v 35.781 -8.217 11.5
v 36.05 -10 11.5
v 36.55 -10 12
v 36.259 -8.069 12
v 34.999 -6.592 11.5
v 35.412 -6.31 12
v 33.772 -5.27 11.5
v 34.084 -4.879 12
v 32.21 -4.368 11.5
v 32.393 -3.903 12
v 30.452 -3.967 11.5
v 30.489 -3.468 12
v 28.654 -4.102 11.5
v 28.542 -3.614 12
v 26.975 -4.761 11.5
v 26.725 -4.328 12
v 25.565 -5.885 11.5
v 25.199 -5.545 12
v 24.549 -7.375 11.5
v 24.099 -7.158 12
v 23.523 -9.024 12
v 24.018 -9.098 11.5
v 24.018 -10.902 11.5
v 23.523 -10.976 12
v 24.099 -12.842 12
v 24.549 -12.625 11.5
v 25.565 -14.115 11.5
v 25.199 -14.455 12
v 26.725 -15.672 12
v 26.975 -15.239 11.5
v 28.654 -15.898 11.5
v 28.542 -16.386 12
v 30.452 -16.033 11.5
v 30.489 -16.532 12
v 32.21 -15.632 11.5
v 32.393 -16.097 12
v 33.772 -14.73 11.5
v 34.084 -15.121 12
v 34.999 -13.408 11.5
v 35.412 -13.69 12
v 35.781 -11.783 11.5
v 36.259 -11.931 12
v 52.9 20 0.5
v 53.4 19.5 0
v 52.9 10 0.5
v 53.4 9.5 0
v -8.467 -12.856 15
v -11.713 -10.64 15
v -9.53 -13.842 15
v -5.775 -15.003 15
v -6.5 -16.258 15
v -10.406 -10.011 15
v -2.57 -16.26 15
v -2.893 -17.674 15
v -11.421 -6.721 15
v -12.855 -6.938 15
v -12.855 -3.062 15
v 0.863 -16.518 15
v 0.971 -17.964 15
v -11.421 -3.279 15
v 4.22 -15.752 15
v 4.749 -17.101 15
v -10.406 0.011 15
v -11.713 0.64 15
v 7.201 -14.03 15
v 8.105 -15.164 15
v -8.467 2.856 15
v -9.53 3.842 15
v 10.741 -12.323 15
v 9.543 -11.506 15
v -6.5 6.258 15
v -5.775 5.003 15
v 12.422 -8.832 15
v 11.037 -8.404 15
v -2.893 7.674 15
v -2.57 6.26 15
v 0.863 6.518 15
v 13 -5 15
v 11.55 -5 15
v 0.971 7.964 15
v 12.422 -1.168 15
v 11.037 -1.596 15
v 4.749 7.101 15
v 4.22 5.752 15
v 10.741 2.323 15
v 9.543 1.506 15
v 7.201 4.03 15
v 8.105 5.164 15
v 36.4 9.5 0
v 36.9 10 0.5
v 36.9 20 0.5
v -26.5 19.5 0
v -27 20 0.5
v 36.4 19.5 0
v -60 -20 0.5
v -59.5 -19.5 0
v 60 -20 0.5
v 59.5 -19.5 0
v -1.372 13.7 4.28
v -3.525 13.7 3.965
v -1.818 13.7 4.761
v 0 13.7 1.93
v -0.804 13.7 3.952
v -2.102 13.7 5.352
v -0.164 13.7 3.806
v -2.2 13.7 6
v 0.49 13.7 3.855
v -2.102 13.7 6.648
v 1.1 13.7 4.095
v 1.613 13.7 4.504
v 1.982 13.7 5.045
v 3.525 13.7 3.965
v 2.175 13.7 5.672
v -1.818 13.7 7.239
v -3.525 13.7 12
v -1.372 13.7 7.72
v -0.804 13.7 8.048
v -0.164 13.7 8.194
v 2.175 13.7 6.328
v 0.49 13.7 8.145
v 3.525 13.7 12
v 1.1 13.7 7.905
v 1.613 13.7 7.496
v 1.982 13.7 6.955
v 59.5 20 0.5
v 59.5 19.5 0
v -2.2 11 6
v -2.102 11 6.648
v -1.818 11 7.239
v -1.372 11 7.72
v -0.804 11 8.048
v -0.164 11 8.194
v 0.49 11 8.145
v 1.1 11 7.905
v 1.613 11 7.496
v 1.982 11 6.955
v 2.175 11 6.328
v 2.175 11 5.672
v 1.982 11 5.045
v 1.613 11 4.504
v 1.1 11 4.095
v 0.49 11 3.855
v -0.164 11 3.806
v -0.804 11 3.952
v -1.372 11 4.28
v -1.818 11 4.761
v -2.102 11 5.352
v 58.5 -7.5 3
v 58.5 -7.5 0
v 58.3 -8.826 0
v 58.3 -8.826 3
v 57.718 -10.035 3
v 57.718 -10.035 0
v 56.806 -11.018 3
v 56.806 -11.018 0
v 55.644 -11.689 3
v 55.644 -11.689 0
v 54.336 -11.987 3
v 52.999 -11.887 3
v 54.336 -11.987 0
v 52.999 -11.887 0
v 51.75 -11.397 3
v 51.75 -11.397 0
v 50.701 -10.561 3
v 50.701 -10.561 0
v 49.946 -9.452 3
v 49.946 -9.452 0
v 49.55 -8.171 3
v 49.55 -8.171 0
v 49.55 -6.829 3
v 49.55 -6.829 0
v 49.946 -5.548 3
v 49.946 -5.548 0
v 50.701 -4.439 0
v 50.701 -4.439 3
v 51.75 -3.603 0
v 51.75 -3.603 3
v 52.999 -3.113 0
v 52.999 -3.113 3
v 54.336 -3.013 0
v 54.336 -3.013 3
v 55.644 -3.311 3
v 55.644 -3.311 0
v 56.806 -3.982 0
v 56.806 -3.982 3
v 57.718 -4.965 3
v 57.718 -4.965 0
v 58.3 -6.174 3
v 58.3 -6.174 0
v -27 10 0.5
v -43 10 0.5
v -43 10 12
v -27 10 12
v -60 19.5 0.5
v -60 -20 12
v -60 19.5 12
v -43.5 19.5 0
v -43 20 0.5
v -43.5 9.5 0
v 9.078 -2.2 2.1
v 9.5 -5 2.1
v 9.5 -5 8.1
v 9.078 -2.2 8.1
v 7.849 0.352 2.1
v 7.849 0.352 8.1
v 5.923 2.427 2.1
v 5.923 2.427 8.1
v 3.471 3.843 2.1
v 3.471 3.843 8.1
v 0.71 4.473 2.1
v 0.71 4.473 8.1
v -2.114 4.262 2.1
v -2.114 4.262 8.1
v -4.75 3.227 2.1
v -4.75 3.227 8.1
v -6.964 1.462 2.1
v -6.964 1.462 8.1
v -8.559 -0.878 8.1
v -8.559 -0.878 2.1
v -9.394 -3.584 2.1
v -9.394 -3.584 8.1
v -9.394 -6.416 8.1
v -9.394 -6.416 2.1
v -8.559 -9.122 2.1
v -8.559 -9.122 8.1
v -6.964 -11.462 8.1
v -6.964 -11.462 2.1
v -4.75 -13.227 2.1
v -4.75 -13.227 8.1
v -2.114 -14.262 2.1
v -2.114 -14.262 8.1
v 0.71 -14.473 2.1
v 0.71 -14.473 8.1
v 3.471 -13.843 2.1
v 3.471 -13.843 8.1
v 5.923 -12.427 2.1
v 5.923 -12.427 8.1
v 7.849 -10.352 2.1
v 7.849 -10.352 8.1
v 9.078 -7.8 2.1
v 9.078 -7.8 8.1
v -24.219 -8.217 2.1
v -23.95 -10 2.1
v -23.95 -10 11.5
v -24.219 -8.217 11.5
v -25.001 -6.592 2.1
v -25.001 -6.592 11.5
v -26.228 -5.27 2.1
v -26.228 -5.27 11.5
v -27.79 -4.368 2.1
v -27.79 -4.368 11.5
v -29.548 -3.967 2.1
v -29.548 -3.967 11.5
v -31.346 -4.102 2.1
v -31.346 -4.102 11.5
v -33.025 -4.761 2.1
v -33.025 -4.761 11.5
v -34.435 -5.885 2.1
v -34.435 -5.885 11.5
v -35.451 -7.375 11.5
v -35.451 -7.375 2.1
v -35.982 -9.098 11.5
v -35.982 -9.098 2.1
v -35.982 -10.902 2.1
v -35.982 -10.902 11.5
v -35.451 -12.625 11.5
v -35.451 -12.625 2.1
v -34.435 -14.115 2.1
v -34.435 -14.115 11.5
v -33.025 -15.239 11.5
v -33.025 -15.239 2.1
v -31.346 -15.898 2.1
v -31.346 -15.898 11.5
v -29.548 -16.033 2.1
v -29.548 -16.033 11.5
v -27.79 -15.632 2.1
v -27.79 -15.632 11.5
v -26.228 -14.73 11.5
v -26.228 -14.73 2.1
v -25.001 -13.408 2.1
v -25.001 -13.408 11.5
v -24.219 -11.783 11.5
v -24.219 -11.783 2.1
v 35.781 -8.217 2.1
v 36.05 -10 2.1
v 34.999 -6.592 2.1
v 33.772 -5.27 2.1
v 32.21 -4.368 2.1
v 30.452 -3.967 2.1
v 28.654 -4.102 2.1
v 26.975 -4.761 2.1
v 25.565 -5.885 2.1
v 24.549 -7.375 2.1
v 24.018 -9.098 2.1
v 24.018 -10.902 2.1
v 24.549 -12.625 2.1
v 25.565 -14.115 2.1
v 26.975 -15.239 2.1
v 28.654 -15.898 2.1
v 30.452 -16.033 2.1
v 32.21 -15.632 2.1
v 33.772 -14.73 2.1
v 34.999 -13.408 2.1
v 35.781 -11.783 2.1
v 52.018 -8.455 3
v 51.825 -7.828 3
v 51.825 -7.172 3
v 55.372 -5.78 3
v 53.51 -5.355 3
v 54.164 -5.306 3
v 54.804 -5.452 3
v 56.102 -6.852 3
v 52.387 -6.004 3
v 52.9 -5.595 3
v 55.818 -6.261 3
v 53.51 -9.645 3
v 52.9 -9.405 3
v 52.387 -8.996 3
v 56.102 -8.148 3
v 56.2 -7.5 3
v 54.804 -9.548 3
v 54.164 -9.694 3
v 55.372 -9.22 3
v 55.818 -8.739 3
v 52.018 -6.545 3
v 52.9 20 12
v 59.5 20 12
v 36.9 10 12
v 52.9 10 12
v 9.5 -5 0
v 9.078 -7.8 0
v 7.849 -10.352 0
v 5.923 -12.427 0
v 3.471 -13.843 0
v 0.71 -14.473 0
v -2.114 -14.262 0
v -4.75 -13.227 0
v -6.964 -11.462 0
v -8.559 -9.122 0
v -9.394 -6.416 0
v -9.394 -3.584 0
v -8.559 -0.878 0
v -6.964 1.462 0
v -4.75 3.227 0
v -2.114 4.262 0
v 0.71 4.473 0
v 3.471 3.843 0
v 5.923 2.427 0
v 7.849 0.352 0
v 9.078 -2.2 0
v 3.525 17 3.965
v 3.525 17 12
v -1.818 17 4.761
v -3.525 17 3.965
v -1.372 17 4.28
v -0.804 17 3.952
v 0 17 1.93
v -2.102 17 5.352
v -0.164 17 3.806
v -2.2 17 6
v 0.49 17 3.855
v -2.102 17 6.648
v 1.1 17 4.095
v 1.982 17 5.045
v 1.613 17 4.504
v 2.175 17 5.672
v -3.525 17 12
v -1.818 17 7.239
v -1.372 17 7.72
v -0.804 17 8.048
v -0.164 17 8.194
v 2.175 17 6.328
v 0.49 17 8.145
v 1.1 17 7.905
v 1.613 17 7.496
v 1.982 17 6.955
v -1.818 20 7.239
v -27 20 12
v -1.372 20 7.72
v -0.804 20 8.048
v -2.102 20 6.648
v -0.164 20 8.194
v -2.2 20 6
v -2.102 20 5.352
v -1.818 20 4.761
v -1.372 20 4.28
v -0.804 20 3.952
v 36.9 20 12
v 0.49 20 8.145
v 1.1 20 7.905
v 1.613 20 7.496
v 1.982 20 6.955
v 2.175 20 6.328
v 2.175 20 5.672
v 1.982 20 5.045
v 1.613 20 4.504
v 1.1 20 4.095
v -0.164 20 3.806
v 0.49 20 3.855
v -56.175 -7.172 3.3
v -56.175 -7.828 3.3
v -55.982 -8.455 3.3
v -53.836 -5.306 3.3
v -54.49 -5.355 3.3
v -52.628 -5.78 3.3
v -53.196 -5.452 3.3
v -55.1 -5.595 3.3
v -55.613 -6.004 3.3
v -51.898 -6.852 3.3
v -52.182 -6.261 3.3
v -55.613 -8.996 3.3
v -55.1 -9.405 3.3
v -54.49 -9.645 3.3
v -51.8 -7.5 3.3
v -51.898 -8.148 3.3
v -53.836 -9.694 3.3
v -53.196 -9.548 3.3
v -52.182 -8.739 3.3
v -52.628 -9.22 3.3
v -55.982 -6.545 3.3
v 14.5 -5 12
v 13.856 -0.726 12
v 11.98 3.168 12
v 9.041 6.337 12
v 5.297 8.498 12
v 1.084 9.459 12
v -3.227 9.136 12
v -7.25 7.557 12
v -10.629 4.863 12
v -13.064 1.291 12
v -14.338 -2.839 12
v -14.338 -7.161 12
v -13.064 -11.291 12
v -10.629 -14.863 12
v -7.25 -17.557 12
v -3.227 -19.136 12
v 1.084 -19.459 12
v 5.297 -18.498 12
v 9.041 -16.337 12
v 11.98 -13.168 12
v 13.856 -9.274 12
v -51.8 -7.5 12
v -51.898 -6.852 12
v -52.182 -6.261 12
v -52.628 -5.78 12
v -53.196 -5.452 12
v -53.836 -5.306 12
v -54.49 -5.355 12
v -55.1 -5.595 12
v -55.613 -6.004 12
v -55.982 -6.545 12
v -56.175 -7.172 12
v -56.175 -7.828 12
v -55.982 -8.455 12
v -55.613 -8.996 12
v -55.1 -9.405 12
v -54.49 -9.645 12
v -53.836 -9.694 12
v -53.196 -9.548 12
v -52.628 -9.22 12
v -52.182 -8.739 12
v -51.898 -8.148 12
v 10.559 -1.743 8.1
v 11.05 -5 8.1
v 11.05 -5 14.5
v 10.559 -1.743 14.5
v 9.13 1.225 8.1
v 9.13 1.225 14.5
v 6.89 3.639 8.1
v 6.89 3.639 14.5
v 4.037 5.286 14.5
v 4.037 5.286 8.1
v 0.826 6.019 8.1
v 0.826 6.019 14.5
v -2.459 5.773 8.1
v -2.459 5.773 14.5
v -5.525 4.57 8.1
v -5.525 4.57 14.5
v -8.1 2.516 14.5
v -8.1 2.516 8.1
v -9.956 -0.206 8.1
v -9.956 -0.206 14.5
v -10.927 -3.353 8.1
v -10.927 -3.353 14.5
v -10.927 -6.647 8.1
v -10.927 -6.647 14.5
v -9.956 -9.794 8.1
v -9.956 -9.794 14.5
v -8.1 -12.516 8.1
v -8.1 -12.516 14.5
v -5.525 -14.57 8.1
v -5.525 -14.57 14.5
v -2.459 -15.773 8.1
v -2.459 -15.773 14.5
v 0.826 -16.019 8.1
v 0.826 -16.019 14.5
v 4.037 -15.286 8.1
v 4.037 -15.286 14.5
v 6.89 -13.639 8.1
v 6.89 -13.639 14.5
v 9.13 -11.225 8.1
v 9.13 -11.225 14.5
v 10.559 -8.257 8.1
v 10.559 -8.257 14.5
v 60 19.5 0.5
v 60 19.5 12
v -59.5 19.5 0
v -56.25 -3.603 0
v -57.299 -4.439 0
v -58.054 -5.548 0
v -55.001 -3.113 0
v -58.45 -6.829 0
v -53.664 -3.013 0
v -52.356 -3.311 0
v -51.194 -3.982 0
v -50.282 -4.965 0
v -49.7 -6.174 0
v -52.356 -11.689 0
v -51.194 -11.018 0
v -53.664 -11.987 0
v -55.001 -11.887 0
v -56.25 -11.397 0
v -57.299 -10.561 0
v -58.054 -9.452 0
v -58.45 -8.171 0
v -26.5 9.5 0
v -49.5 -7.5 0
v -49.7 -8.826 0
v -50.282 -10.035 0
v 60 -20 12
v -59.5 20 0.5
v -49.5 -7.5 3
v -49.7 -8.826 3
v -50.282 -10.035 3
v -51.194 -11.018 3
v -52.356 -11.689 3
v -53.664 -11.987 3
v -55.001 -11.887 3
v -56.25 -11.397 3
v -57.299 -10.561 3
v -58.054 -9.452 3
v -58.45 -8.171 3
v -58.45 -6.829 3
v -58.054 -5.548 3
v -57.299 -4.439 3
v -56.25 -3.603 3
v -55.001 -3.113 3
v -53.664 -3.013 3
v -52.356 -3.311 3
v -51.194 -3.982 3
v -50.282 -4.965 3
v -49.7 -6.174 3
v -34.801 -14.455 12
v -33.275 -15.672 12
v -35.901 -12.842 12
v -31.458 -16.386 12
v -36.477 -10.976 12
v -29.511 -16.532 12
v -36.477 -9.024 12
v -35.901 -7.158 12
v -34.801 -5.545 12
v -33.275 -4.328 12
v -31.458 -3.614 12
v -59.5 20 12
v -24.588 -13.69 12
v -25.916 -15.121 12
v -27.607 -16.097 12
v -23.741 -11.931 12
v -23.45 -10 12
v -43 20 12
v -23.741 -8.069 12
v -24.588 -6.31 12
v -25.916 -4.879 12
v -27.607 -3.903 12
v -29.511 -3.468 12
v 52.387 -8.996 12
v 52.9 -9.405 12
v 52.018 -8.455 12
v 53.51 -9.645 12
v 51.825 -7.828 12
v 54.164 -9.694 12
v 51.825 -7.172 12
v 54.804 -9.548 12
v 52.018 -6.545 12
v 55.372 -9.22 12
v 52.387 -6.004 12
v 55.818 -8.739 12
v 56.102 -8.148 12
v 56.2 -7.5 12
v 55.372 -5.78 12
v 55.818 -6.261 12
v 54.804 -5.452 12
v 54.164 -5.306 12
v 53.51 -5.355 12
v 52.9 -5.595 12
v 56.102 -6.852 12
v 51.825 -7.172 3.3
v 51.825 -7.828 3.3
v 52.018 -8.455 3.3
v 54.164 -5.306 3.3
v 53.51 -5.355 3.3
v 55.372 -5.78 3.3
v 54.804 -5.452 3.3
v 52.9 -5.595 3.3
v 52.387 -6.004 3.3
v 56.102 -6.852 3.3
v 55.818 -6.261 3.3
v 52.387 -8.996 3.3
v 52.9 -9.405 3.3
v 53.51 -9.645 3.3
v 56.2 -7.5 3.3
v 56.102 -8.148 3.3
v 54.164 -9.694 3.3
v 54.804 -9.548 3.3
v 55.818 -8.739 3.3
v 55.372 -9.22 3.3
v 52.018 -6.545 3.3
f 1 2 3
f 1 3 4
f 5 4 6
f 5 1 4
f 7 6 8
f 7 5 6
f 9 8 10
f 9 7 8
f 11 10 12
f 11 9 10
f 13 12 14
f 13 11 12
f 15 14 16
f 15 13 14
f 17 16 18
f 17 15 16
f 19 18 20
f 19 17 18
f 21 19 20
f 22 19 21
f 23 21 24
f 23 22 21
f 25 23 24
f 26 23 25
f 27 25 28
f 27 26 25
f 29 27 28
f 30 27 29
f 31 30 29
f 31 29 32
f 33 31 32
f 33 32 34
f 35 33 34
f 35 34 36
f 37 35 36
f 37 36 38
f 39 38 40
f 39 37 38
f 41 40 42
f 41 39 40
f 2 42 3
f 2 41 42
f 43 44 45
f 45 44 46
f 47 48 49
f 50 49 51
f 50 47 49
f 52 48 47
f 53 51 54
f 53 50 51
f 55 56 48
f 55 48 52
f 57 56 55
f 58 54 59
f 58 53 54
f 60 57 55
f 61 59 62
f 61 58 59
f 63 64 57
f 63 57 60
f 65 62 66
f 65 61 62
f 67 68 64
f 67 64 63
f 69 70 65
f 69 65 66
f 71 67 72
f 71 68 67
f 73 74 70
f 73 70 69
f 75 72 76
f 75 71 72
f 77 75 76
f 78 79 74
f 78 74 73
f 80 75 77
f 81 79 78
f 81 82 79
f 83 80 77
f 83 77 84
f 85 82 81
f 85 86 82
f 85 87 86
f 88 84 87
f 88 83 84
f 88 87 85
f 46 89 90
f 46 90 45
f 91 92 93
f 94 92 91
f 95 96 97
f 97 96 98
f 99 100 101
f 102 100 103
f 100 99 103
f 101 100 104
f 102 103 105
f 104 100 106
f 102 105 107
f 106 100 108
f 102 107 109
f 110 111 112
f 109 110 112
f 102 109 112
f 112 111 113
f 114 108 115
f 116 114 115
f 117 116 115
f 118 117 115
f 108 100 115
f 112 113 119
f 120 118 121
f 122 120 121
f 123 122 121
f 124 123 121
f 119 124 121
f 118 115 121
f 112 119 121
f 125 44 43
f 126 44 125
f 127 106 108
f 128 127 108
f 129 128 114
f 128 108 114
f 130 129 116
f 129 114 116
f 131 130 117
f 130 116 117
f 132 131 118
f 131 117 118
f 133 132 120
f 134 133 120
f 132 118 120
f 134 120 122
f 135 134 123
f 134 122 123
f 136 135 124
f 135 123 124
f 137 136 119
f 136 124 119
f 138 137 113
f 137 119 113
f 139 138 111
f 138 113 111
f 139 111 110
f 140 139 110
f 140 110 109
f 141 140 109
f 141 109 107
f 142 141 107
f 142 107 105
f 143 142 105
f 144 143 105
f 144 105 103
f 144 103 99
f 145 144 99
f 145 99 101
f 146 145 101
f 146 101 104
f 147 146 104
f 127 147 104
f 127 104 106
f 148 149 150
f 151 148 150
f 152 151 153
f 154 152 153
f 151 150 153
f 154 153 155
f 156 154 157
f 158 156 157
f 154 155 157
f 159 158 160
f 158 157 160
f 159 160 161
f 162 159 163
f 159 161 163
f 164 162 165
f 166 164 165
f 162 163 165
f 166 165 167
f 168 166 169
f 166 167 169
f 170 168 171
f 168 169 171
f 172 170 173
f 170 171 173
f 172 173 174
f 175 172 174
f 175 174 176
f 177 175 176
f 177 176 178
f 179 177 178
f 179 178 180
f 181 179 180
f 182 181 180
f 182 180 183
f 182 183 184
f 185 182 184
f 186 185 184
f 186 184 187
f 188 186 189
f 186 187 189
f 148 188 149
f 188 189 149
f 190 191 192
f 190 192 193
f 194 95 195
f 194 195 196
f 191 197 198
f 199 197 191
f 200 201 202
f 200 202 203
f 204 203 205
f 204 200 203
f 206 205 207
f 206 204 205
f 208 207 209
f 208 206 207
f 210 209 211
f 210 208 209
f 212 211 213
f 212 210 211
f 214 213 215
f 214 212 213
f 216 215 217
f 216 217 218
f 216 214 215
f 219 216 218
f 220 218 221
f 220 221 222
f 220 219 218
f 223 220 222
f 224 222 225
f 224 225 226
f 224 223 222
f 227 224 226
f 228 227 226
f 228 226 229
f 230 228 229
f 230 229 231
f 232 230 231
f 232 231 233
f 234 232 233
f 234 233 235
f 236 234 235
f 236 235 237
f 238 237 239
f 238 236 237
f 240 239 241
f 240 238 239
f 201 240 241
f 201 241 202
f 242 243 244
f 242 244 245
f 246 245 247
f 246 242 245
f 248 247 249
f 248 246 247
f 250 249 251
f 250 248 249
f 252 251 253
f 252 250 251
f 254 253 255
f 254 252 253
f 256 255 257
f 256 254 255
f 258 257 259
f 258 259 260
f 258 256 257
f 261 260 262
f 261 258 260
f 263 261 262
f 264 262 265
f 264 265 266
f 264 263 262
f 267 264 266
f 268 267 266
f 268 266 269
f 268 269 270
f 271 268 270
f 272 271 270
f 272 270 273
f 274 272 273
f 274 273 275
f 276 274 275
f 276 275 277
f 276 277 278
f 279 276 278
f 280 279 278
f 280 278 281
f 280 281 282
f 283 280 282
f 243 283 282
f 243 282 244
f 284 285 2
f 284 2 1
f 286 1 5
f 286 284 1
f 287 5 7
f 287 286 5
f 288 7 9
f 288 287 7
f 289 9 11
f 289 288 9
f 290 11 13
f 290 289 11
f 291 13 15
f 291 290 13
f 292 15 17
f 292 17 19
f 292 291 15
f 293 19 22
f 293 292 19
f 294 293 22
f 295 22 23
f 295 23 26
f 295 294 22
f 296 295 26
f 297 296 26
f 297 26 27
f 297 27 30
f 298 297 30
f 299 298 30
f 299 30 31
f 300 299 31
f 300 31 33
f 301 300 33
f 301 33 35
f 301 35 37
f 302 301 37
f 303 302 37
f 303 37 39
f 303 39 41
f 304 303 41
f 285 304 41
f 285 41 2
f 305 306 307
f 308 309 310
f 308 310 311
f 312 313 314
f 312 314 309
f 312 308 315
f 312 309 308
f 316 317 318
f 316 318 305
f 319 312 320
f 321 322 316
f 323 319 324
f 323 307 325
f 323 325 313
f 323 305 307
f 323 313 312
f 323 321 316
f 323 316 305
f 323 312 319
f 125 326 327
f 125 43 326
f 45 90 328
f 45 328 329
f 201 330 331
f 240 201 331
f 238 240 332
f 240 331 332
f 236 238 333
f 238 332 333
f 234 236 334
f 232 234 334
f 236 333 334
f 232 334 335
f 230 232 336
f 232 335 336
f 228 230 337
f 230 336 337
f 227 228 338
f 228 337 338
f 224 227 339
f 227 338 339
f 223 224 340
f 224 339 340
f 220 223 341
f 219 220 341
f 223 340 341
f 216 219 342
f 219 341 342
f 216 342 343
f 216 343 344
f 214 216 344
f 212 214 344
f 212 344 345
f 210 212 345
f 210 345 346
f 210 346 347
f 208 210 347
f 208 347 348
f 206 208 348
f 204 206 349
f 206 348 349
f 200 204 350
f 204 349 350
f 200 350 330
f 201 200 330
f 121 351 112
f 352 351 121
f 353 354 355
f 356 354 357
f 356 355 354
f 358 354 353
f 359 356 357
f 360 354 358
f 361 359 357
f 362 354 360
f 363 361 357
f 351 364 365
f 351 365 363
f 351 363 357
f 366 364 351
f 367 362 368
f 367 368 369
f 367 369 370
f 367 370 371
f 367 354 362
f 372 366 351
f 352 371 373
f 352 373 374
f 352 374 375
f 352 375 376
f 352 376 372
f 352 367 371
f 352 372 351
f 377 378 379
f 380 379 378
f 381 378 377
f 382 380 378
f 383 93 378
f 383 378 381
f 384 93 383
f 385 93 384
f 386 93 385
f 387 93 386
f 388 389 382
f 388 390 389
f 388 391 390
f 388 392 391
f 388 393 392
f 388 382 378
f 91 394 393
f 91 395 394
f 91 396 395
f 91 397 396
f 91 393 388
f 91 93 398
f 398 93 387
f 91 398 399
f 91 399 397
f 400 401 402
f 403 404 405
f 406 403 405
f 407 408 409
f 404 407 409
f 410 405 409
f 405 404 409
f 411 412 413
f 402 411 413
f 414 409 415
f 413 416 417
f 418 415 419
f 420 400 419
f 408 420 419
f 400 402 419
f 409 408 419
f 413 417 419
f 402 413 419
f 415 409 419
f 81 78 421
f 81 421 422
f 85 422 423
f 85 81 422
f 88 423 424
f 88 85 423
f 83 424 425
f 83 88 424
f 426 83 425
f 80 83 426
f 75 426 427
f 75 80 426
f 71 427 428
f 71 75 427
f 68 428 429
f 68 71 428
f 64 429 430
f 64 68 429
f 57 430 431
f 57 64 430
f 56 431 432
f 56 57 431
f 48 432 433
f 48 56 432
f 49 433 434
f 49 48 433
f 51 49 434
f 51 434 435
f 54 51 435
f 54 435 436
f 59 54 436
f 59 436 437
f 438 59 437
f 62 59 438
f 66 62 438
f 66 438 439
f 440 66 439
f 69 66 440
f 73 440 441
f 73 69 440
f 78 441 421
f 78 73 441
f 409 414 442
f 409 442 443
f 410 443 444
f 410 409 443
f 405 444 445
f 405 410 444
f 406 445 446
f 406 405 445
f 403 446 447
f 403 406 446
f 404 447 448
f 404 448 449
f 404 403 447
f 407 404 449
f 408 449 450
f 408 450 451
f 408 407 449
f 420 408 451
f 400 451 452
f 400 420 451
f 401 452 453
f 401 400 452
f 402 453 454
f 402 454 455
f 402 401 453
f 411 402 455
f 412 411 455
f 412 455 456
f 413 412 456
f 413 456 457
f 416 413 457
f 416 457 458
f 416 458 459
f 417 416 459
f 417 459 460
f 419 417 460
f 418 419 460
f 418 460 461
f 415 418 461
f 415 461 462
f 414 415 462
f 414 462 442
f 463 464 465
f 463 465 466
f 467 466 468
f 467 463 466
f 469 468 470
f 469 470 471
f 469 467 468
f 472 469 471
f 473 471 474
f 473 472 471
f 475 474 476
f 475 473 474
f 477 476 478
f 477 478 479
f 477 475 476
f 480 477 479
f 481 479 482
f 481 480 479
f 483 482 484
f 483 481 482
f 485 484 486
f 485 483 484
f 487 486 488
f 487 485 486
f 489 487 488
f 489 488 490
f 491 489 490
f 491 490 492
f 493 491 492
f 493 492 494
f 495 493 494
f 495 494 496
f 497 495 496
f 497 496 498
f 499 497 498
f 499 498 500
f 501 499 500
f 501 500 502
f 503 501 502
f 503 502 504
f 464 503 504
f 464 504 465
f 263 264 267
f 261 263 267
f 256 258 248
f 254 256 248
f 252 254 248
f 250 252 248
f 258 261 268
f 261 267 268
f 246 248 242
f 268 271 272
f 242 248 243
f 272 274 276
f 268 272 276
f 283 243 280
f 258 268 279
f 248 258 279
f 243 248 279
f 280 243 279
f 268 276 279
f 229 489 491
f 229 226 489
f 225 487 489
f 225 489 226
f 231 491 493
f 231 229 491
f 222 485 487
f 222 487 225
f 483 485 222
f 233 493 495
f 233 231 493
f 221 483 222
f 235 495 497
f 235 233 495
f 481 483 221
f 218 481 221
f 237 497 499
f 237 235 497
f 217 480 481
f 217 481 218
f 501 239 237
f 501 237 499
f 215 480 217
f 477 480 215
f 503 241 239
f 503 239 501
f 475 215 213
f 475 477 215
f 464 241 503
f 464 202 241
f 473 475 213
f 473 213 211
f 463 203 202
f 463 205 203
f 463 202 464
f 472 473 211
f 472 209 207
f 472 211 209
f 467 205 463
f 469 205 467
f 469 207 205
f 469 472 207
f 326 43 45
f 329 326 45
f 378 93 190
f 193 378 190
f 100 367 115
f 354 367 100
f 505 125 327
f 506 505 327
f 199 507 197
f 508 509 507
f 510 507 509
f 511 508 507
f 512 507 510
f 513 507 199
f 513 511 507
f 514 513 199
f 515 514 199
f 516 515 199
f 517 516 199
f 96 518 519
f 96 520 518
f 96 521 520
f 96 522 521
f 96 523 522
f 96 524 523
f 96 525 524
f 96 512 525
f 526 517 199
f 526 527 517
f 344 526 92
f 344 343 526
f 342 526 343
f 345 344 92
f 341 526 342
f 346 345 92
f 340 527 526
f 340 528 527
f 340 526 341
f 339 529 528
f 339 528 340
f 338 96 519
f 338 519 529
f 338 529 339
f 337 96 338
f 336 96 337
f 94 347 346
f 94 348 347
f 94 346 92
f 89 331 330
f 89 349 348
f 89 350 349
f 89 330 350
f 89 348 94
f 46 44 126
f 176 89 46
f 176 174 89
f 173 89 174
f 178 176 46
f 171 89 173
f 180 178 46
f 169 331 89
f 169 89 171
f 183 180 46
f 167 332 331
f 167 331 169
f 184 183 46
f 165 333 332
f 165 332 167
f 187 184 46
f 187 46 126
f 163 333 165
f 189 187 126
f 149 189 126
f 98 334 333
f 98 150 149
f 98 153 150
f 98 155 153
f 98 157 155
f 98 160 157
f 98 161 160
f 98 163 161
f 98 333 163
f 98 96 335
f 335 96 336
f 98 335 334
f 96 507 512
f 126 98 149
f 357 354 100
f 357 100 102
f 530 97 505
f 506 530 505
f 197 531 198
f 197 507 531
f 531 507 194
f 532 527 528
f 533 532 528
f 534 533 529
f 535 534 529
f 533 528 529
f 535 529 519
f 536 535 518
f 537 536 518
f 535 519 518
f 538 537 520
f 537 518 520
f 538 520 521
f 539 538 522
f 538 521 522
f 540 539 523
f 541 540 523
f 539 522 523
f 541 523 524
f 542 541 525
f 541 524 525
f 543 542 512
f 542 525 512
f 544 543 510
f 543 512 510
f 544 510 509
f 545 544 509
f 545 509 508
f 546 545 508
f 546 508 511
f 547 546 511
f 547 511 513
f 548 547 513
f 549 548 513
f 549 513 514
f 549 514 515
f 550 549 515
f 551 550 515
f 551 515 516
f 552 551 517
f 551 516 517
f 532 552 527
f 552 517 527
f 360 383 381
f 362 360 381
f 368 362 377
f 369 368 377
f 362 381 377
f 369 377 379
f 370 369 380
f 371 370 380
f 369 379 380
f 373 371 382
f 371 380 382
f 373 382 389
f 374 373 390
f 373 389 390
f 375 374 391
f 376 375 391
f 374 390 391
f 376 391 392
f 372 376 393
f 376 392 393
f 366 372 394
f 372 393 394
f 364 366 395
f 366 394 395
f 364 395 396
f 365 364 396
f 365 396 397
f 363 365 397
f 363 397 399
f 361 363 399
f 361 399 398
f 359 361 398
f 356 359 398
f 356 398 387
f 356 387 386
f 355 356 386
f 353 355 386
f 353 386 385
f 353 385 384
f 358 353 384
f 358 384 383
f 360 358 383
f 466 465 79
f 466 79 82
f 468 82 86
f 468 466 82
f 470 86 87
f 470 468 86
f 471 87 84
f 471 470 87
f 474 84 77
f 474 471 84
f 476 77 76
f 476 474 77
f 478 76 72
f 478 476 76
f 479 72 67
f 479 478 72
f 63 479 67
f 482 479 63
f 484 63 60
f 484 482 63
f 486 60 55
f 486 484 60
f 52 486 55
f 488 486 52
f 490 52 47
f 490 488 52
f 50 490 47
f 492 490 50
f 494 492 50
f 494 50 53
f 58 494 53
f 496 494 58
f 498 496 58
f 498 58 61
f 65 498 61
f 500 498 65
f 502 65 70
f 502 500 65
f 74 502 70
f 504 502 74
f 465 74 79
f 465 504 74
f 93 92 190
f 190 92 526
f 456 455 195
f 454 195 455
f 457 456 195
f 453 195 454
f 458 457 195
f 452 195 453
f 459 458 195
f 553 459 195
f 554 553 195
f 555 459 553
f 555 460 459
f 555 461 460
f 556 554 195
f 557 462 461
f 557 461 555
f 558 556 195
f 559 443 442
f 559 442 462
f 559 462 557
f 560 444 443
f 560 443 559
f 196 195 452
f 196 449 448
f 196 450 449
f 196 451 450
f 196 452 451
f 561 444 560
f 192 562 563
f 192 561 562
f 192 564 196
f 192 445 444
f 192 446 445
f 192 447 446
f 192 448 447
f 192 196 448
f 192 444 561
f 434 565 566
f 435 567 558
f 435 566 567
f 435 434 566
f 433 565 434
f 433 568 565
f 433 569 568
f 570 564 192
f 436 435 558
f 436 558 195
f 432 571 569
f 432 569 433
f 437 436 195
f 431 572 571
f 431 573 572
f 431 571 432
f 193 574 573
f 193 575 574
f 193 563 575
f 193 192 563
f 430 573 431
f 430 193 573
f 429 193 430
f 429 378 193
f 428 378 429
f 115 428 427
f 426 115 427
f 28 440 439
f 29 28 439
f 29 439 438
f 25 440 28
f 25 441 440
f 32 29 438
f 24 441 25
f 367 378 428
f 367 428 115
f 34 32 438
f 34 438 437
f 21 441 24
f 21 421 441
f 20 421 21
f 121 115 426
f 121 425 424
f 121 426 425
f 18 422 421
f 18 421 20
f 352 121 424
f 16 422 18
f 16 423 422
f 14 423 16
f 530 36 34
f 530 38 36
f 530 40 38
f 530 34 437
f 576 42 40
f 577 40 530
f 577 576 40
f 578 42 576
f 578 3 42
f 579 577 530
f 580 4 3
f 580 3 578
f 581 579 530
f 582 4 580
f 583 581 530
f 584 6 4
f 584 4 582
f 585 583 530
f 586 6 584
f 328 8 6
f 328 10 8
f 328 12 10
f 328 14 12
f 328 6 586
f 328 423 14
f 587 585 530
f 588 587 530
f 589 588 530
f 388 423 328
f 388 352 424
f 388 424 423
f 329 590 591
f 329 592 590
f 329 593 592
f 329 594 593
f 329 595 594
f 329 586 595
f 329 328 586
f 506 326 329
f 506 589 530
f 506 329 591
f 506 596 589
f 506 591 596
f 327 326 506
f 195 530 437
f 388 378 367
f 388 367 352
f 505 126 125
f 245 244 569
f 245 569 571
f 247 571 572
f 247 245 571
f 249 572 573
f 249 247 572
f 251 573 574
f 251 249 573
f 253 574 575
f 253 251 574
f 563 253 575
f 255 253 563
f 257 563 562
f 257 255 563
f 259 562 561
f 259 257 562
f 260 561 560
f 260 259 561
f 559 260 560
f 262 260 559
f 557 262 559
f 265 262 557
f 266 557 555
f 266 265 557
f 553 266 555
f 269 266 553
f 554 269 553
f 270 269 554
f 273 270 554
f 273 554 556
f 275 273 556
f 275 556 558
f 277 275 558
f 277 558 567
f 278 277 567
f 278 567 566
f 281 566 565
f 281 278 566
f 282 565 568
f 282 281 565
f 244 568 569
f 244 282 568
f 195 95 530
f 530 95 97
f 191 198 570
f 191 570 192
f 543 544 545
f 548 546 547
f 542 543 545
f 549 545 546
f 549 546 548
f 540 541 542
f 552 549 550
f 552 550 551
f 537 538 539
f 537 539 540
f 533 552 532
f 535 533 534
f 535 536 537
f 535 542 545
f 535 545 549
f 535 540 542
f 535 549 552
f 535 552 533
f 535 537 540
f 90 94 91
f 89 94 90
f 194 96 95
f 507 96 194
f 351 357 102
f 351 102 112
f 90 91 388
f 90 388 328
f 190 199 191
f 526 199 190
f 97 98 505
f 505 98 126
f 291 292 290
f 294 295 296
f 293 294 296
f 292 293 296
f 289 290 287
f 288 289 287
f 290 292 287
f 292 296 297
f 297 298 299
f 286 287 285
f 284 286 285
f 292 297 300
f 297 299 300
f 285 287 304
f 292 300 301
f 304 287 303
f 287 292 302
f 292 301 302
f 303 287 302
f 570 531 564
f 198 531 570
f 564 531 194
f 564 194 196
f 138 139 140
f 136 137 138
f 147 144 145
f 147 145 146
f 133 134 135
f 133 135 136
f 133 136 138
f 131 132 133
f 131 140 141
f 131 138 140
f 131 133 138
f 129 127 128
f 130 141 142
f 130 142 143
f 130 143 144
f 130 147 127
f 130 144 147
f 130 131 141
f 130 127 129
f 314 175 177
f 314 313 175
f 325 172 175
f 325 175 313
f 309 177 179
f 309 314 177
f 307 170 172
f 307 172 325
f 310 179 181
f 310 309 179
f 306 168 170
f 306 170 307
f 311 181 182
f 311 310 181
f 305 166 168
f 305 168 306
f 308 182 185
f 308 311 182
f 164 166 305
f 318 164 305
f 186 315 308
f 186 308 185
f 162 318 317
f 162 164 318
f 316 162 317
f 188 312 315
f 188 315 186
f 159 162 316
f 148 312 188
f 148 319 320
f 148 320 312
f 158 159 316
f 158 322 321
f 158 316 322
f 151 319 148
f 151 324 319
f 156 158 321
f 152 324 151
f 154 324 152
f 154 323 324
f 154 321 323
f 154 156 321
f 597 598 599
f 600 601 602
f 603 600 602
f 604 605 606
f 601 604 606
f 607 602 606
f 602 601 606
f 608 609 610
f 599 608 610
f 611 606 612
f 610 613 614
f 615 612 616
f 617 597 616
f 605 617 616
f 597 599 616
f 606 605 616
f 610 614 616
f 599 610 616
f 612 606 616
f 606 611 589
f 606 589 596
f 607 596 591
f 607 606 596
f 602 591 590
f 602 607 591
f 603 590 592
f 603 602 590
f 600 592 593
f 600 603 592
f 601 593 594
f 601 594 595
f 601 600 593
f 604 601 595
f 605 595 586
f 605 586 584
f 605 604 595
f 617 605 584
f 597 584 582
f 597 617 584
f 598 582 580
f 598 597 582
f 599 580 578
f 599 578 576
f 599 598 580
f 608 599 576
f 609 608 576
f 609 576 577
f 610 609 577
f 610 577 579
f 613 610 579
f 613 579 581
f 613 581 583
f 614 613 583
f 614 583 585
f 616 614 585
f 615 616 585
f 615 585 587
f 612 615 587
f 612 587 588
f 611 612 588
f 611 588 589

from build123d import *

# Parameters (mm, degrees)
PAD005_DEPTH    = 3.3
SKETCH_W        = 120
SKETCH_H        = 40
SKETCH_R        = 6.05
SKETCH_R_2      = 2.2
SKETCH_R_3      = 11.05
PAD_DEPTH       = 12
SKETCH001_W     = 16
SKETCH001_H     = 10
POCKET_DEPTH    = 12.001
SKETCH002_R     = 4.5
POCKET001_DEPTH = 3
SKETCH003_R     = 11.05
SKETCH003_R_2   = 9.5
SKETCH003_R_3   = 6.05
PAD001_DEPTH    = 2.1
SKETCH005_R     = 11.05
SKETCH005_R_2   = 9.5
PAD002_DEPTH    = 6
SKETCH006_R     = 13
SKETCH006_R_2   = 11.05
PAD003_DEPTH    = 3
SKETCH008_R     = 2.2
POCKET002_DEPTH = 9
CHAMFER_SIZE    = 0.5
CHAMFER001_SIZE = 0.5
SKETCH004_R     = 2.2
PAD006_DEPTH    = 0.3


with BuildPart() as fixierungsmutter:
    # Sketch009 → Pad005 (new body)
    with BuildSketch(Plane.XZ.offset(-17)):
        Polygon((3.525, 3.96484), (3.525, 8.03516), (3.525, 12), (-3.525, 12), (-3.525, 8.03516), (-3.525, 3.96484), (0, 1.929681), align=None)
    extrude(amount=PAD005_DEPTH)


with BuildPart() as verstaerkung_halterung_lager:
    # Sketch007 → Revolution (revolve)
    with BuildSketch(Plane.XZ.offset(5)):
        Polygon((13, 15), (13, 12), (14.5, 12), align=None)
    revolve(axis=Axis((0, -5, 0), (0, 0, 1)))


with BuildPart() as druckbar:
    # Sketch → Pad (new body)
    with BuildSketch(Plane.XY):
        Rectangle(SKETCH_W, SKETCH_H)
        with Locations((-30, -10)):
            Circle(SKETCH_R, mode=Mode.SUBTRACT)
        with Locations((30, -10)):
            Circle(SKETCH_R, mode=Mode.SUBTRACT)
        with Locations((-54, -7.5)):
            Circle(SKETCH_R_2, mode=Mode.SUBTRACT)
        with Locations((54, -7.5)):
            Circle(SKETCH_R_2, mode=Mode.SUBTRACT)
        with Locations((0, -5)):
            Circle(SKETCH_R_3, mode=Mode.SUBTRACT)
    extrude(amount=PAD_DEPTH)

    # Sketch001 → Pocket (cut, through all)
    with BuildSketch(Plane(origin=(0, 0, 0), x_dir=(1, 0, 0), z_dir=(0, 0, -1))):
        with Locations((-35, -15)):
            Rectangle(SKETCH001_W, SKETCH001_H)
        with Locations((44.9, -15)):
            Rectangle(SKETCH001_W, SKETCH001_H)
    extrude(amount=-POCKET_DEPTH, mode=Mode.SUBTRACT)

    # Sketch002 → Pocket001 (cut)
    with BuildSketch(Plane(origin=(0, 0, 0), x_dir=(1, 0, 0), z_dir=(0, 0, -1))):
        with Locations((-54, 7.5)):
            Circle(SKETCH002_R)
        with Locations((54, 7.5)):
            Circle(SKETCH002_R)
    extrude(amount=-POCKET001_DEPTH, mode=Mode.SUBTRACT)

    # Sketch003 → Pad001 (new body)
    with BuildSketch(Plane(origin=(0, 0, 0), x_dir=(1, 0, 0), z_dir=(0, 0, -1))):
        with Locations((0, 5)):
            Circle(SKETCH003_R)
        with Locations((0, 5)):
            Circle(SKETCH003_R_2, mode=Mode.SUBTRACT)
        with Locations((-30, 10)):
            Circle(SKETCH003_R_3)
        with Locations((30, 10)):
            Circle(SKETCH003_R_3)
    extrude(amount=-PAD001_DEPTH)

    # Sketch005 → Pad002 (new body)
    with BuildSketch(Plane.XY.offset(2.1)):
        with Locations((0, -5)):
            Circle(SKETCH005_R)
        with Locations((0, -5)):
            Circle(SKETCH005_R_2, mode=Mode.SUBTRACT)
    extrude(amount=PAD002_DEPTH)

    # Sketch006 → Pad003 (new body)
    with BuildSketch(Plane.XY.offset(12)):
        with Locations((0, -5)):
            Circle(SKETCH006_R)
        with Locations((0, -5)):
            Circle(SKETCH006_R_2, mode=Mode.SUBTRACT)
    extrude(amount=PAD003_DEPTH)

    # Fusion: union Verstaerkung Halterung Lager
    add(verstaerkung_halterung_lager.part)

    # Sketch008 → Pocket002 (cut)
    with BuildSketch(Plane(origin=(0, 20, 0), x_dir=(-1, 0, 0), z_dir=(0, 1, 0))):
        with Locations((0, 6)):
            Circle(SKETCH008_R)
    extrude(amount=-POCKET002_DEPTH, mode=Mode.SUBTRACT)

    # Cut: cut Fixierungsmutter
    add(fixierungsmutter.part, mode=Mode.SUBTRACT)

    # Chamfer
    chamfer_edges = [druckbar.edges().sort_by_distance(p)[0] for p in [
        (23.95, -10, 12),
        (-11.05, -5, 15),
        (-36.05, -10, 12),
    ]]
    chamfer(chamfer_edges, length=CHAMFER_SIZE)

    # Chamfer001
    chamfer001_edges = [druckbar.edges().sort_by_distance(p)[0] for p in [
        (0, -20, 0),
        (60, 0, 0),
        (56.45, 20, 0),
        (52.9, 15, 0),
        (44.9, 10, 0),
        (36.9, 15, 0),
        (4.95, 20, 0),
        (-27, 15, 0),
        (-35, 10, 0),
        (-43, 15, 0),
        (-51.5, 20, 0),
        (-60, 0, 0),
        (-60, 20, 6),
        (60, 20, 6),
    ]]
    chamfer(chamfer001_edges, length=CHAMFER001_SIZE)

    # Sketch004 → Pad006 (new body)
    with BuildSketch(Plane(origin=(0, 0, 3), x_dir=(1, 0, 0), z_dir=(0, 0, -1))):
        with Locations((-54, 7.5)):
            Circle(SKETCH004_R)
        with Locations((54, 7.5)):
            Circle(SKETCH004_R)
    extrude(amount=-PAD006_DEPTH)


solid = druckbar.part
